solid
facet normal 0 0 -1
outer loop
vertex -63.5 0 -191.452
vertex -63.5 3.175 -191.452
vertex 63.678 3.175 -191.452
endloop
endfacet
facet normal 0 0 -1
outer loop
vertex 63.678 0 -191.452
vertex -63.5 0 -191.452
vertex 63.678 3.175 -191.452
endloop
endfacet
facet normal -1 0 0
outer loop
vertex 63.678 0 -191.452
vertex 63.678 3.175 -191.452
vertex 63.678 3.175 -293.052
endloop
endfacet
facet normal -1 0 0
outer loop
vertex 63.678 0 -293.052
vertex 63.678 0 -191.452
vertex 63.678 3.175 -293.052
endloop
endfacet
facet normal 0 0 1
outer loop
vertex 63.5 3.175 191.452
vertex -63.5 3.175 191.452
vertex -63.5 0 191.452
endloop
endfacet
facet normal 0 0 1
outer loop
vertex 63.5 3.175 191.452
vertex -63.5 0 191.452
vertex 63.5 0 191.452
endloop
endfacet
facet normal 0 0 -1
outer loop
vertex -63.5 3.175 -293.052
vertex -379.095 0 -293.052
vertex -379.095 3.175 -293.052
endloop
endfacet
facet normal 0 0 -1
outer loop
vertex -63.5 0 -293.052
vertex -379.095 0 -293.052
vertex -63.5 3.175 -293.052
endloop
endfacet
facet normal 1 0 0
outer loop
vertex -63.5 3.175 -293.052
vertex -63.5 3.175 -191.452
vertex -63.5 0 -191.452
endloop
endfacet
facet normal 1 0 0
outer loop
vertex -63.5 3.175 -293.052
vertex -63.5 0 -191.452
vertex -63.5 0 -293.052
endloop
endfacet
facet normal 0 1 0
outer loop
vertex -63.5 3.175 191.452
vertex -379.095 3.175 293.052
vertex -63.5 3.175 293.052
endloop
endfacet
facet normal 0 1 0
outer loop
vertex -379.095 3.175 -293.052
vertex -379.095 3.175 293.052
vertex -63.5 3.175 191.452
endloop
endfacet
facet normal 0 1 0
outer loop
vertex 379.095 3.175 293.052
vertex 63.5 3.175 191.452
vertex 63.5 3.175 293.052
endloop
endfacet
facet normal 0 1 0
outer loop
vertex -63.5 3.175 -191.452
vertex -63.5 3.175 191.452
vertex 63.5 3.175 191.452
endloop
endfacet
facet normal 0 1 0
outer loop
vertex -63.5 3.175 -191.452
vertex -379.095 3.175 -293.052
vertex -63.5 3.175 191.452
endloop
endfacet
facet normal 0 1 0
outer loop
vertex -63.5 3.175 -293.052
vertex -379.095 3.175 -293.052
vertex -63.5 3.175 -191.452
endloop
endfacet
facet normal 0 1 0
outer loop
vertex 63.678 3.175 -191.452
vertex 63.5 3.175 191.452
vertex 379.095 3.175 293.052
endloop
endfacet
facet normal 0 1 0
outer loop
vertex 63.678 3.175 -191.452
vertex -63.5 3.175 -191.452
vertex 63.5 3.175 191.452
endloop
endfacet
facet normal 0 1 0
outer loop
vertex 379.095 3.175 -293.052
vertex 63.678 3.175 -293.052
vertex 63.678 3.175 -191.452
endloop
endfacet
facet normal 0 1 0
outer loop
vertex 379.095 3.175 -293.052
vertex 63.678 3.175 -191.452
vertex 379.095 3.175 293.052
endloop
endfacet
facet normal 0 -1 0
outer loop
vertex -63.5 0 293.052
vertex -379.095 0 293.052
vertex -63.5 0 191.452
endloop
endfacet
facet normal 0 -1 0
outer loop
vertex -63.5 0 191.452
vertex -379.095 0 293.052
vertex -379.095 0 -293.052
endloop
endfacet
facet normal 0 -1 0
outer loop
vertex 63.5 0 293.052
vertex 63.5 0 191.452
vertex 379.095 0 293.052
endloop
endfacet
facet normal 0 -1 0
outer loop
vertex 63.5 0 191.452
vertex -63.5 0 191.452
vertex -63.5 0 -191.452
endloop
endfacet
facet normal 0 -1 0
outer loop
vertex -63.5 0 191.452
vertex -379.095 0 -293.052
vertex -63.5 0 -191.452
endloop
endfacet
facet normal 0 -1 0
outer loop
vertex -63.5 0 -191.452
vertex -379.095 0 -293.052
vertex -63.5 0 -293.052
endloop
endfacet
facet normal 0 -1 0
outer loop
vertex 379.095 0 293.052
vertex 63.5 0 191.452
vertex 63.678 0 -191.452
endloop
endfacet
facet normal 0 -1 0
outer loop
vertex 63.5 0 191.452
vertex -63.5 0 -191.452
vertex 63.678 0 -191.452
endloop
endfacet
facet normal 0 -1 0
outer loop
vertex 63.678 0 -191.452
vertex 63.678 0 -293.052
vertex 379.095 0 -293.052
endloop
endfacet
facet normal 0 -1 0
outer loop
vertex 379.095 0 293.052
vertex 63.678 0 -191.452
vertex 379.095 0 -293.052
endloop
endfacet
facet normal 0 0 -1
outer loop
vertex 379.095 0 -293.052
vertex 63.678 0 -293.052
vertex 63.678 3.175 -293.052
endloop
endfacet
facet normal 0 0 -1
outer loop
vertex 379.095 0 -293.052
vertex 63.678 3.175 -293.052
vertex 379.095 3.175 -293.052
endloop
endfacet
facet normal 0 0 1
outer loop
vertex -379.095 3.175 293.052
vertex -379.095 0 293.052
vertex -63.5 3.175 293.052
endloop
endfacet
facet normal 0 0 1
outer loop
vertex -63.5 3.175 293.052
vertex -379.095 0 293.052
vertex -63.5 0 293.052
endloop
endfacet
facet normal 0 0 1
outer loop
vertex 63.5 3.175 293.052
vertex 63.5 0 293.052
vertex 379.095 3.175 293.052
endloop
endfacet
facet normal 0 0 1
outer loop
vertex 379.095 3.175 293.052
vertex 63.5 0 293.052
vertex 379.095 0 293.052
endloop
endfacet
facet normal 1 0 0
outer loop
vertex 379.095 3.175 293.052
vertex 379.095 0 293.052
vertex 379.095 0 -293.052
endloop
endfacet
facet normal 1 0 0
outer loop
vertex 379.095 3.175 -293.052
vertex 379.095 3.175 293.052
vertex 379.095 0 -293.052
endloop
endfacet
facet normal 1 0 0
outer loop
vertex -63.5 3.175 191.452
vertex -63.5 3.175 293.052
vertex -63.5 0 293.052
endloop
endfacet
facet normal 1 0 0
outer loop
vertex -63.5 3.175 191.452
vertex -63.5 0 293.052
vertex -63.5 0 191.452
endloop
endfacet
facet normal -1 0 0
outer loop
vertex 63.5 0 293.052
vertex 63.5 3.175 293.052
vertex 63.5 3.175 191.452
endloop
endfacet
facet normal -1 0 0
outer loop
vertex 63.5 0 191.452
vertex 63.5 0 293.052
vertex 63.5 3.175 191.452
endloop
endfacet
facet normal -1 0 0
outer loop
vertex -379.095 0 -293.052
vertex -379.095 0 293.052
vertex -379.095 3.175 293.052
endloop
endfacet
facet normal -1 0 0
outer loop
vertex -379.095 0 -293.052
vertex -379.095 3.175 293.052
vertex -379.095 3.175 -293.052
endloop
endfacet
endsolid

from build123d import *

# Parameters (mm, degrees)
SKETCH1_W           = 758.19
SKETCH1_H           = 586.105
BOSS_EXTRUDE1_DEPTH = 3.175
CUT_EXTRUDE1_REACH  = 481.169
SKETCH2_W           = 127
SKETCH2_H           = 101.6
SKETCH2_W_2         = 127.178209898


with BuildPart() as part:
    # Sketch1 → Boss-Extrude1 (new body)
    with BuildSketch(Plane(origin=(0, 0, 0), x_dir=(1, 0, 0), z_dir=(0, 1, 0))):
        Rectangle(SKETCH1_W, SKETCH1_H)
    extrude(amount=BOSS_EXTRUDE1_DEPTH)

    # Sketch2 → Cut-Extrude1 (cut, up to next)
    with BuildSketch(Plane(origin=(0, 3.175, 0), x_dir=(1, 0, 0), z_dir=(0, 1, 0)), mode=Mode.PRIVATE) as cut_extrude1_sk1:
        with Locations((0, -242.2525)):
            Rectangle(SKETCH2_W, SKETCH2_H)
    cut_extrude1_tool1 = extrude(cut_extrude1_sk1.sketch, amount=-CUT_EXTRUDE1_REACH, mode=Mode.PRIVATE) & part.part
    # Sketch2 → Cut-Extrude1 (cut, up to next)
    with BuildSketch(Plane(origin=(0, 3.175, 0), x_dir=(1, 0, 0), z_dir=(0, 1, 0)), mode=Mode.PRIVATE) as cut_extrude1_sk2:
        with Locations((0.089104949, 242.2525)):
            Rectangle(SKETCH2_W_2, SKETCH2_H)
    cut_extrude1_tool2 = extrude(cut_extrude1_sk2.sketch, amount=-CUT_EXTRUDE1_REACH, mode=Mode.PRIVATE) & part.part
    add(cut_extrude1_tool1.solids().sort_by_distance((0, 3.175, 242.2525))[0], mode=Mode.SUBTRACT)
    add(cut_extrude1_tool2.solids().sort_by_distance((0.089105, 3.175, -242.2525))[0], mode=Mode.SUBTRACT)


solid = part.part
